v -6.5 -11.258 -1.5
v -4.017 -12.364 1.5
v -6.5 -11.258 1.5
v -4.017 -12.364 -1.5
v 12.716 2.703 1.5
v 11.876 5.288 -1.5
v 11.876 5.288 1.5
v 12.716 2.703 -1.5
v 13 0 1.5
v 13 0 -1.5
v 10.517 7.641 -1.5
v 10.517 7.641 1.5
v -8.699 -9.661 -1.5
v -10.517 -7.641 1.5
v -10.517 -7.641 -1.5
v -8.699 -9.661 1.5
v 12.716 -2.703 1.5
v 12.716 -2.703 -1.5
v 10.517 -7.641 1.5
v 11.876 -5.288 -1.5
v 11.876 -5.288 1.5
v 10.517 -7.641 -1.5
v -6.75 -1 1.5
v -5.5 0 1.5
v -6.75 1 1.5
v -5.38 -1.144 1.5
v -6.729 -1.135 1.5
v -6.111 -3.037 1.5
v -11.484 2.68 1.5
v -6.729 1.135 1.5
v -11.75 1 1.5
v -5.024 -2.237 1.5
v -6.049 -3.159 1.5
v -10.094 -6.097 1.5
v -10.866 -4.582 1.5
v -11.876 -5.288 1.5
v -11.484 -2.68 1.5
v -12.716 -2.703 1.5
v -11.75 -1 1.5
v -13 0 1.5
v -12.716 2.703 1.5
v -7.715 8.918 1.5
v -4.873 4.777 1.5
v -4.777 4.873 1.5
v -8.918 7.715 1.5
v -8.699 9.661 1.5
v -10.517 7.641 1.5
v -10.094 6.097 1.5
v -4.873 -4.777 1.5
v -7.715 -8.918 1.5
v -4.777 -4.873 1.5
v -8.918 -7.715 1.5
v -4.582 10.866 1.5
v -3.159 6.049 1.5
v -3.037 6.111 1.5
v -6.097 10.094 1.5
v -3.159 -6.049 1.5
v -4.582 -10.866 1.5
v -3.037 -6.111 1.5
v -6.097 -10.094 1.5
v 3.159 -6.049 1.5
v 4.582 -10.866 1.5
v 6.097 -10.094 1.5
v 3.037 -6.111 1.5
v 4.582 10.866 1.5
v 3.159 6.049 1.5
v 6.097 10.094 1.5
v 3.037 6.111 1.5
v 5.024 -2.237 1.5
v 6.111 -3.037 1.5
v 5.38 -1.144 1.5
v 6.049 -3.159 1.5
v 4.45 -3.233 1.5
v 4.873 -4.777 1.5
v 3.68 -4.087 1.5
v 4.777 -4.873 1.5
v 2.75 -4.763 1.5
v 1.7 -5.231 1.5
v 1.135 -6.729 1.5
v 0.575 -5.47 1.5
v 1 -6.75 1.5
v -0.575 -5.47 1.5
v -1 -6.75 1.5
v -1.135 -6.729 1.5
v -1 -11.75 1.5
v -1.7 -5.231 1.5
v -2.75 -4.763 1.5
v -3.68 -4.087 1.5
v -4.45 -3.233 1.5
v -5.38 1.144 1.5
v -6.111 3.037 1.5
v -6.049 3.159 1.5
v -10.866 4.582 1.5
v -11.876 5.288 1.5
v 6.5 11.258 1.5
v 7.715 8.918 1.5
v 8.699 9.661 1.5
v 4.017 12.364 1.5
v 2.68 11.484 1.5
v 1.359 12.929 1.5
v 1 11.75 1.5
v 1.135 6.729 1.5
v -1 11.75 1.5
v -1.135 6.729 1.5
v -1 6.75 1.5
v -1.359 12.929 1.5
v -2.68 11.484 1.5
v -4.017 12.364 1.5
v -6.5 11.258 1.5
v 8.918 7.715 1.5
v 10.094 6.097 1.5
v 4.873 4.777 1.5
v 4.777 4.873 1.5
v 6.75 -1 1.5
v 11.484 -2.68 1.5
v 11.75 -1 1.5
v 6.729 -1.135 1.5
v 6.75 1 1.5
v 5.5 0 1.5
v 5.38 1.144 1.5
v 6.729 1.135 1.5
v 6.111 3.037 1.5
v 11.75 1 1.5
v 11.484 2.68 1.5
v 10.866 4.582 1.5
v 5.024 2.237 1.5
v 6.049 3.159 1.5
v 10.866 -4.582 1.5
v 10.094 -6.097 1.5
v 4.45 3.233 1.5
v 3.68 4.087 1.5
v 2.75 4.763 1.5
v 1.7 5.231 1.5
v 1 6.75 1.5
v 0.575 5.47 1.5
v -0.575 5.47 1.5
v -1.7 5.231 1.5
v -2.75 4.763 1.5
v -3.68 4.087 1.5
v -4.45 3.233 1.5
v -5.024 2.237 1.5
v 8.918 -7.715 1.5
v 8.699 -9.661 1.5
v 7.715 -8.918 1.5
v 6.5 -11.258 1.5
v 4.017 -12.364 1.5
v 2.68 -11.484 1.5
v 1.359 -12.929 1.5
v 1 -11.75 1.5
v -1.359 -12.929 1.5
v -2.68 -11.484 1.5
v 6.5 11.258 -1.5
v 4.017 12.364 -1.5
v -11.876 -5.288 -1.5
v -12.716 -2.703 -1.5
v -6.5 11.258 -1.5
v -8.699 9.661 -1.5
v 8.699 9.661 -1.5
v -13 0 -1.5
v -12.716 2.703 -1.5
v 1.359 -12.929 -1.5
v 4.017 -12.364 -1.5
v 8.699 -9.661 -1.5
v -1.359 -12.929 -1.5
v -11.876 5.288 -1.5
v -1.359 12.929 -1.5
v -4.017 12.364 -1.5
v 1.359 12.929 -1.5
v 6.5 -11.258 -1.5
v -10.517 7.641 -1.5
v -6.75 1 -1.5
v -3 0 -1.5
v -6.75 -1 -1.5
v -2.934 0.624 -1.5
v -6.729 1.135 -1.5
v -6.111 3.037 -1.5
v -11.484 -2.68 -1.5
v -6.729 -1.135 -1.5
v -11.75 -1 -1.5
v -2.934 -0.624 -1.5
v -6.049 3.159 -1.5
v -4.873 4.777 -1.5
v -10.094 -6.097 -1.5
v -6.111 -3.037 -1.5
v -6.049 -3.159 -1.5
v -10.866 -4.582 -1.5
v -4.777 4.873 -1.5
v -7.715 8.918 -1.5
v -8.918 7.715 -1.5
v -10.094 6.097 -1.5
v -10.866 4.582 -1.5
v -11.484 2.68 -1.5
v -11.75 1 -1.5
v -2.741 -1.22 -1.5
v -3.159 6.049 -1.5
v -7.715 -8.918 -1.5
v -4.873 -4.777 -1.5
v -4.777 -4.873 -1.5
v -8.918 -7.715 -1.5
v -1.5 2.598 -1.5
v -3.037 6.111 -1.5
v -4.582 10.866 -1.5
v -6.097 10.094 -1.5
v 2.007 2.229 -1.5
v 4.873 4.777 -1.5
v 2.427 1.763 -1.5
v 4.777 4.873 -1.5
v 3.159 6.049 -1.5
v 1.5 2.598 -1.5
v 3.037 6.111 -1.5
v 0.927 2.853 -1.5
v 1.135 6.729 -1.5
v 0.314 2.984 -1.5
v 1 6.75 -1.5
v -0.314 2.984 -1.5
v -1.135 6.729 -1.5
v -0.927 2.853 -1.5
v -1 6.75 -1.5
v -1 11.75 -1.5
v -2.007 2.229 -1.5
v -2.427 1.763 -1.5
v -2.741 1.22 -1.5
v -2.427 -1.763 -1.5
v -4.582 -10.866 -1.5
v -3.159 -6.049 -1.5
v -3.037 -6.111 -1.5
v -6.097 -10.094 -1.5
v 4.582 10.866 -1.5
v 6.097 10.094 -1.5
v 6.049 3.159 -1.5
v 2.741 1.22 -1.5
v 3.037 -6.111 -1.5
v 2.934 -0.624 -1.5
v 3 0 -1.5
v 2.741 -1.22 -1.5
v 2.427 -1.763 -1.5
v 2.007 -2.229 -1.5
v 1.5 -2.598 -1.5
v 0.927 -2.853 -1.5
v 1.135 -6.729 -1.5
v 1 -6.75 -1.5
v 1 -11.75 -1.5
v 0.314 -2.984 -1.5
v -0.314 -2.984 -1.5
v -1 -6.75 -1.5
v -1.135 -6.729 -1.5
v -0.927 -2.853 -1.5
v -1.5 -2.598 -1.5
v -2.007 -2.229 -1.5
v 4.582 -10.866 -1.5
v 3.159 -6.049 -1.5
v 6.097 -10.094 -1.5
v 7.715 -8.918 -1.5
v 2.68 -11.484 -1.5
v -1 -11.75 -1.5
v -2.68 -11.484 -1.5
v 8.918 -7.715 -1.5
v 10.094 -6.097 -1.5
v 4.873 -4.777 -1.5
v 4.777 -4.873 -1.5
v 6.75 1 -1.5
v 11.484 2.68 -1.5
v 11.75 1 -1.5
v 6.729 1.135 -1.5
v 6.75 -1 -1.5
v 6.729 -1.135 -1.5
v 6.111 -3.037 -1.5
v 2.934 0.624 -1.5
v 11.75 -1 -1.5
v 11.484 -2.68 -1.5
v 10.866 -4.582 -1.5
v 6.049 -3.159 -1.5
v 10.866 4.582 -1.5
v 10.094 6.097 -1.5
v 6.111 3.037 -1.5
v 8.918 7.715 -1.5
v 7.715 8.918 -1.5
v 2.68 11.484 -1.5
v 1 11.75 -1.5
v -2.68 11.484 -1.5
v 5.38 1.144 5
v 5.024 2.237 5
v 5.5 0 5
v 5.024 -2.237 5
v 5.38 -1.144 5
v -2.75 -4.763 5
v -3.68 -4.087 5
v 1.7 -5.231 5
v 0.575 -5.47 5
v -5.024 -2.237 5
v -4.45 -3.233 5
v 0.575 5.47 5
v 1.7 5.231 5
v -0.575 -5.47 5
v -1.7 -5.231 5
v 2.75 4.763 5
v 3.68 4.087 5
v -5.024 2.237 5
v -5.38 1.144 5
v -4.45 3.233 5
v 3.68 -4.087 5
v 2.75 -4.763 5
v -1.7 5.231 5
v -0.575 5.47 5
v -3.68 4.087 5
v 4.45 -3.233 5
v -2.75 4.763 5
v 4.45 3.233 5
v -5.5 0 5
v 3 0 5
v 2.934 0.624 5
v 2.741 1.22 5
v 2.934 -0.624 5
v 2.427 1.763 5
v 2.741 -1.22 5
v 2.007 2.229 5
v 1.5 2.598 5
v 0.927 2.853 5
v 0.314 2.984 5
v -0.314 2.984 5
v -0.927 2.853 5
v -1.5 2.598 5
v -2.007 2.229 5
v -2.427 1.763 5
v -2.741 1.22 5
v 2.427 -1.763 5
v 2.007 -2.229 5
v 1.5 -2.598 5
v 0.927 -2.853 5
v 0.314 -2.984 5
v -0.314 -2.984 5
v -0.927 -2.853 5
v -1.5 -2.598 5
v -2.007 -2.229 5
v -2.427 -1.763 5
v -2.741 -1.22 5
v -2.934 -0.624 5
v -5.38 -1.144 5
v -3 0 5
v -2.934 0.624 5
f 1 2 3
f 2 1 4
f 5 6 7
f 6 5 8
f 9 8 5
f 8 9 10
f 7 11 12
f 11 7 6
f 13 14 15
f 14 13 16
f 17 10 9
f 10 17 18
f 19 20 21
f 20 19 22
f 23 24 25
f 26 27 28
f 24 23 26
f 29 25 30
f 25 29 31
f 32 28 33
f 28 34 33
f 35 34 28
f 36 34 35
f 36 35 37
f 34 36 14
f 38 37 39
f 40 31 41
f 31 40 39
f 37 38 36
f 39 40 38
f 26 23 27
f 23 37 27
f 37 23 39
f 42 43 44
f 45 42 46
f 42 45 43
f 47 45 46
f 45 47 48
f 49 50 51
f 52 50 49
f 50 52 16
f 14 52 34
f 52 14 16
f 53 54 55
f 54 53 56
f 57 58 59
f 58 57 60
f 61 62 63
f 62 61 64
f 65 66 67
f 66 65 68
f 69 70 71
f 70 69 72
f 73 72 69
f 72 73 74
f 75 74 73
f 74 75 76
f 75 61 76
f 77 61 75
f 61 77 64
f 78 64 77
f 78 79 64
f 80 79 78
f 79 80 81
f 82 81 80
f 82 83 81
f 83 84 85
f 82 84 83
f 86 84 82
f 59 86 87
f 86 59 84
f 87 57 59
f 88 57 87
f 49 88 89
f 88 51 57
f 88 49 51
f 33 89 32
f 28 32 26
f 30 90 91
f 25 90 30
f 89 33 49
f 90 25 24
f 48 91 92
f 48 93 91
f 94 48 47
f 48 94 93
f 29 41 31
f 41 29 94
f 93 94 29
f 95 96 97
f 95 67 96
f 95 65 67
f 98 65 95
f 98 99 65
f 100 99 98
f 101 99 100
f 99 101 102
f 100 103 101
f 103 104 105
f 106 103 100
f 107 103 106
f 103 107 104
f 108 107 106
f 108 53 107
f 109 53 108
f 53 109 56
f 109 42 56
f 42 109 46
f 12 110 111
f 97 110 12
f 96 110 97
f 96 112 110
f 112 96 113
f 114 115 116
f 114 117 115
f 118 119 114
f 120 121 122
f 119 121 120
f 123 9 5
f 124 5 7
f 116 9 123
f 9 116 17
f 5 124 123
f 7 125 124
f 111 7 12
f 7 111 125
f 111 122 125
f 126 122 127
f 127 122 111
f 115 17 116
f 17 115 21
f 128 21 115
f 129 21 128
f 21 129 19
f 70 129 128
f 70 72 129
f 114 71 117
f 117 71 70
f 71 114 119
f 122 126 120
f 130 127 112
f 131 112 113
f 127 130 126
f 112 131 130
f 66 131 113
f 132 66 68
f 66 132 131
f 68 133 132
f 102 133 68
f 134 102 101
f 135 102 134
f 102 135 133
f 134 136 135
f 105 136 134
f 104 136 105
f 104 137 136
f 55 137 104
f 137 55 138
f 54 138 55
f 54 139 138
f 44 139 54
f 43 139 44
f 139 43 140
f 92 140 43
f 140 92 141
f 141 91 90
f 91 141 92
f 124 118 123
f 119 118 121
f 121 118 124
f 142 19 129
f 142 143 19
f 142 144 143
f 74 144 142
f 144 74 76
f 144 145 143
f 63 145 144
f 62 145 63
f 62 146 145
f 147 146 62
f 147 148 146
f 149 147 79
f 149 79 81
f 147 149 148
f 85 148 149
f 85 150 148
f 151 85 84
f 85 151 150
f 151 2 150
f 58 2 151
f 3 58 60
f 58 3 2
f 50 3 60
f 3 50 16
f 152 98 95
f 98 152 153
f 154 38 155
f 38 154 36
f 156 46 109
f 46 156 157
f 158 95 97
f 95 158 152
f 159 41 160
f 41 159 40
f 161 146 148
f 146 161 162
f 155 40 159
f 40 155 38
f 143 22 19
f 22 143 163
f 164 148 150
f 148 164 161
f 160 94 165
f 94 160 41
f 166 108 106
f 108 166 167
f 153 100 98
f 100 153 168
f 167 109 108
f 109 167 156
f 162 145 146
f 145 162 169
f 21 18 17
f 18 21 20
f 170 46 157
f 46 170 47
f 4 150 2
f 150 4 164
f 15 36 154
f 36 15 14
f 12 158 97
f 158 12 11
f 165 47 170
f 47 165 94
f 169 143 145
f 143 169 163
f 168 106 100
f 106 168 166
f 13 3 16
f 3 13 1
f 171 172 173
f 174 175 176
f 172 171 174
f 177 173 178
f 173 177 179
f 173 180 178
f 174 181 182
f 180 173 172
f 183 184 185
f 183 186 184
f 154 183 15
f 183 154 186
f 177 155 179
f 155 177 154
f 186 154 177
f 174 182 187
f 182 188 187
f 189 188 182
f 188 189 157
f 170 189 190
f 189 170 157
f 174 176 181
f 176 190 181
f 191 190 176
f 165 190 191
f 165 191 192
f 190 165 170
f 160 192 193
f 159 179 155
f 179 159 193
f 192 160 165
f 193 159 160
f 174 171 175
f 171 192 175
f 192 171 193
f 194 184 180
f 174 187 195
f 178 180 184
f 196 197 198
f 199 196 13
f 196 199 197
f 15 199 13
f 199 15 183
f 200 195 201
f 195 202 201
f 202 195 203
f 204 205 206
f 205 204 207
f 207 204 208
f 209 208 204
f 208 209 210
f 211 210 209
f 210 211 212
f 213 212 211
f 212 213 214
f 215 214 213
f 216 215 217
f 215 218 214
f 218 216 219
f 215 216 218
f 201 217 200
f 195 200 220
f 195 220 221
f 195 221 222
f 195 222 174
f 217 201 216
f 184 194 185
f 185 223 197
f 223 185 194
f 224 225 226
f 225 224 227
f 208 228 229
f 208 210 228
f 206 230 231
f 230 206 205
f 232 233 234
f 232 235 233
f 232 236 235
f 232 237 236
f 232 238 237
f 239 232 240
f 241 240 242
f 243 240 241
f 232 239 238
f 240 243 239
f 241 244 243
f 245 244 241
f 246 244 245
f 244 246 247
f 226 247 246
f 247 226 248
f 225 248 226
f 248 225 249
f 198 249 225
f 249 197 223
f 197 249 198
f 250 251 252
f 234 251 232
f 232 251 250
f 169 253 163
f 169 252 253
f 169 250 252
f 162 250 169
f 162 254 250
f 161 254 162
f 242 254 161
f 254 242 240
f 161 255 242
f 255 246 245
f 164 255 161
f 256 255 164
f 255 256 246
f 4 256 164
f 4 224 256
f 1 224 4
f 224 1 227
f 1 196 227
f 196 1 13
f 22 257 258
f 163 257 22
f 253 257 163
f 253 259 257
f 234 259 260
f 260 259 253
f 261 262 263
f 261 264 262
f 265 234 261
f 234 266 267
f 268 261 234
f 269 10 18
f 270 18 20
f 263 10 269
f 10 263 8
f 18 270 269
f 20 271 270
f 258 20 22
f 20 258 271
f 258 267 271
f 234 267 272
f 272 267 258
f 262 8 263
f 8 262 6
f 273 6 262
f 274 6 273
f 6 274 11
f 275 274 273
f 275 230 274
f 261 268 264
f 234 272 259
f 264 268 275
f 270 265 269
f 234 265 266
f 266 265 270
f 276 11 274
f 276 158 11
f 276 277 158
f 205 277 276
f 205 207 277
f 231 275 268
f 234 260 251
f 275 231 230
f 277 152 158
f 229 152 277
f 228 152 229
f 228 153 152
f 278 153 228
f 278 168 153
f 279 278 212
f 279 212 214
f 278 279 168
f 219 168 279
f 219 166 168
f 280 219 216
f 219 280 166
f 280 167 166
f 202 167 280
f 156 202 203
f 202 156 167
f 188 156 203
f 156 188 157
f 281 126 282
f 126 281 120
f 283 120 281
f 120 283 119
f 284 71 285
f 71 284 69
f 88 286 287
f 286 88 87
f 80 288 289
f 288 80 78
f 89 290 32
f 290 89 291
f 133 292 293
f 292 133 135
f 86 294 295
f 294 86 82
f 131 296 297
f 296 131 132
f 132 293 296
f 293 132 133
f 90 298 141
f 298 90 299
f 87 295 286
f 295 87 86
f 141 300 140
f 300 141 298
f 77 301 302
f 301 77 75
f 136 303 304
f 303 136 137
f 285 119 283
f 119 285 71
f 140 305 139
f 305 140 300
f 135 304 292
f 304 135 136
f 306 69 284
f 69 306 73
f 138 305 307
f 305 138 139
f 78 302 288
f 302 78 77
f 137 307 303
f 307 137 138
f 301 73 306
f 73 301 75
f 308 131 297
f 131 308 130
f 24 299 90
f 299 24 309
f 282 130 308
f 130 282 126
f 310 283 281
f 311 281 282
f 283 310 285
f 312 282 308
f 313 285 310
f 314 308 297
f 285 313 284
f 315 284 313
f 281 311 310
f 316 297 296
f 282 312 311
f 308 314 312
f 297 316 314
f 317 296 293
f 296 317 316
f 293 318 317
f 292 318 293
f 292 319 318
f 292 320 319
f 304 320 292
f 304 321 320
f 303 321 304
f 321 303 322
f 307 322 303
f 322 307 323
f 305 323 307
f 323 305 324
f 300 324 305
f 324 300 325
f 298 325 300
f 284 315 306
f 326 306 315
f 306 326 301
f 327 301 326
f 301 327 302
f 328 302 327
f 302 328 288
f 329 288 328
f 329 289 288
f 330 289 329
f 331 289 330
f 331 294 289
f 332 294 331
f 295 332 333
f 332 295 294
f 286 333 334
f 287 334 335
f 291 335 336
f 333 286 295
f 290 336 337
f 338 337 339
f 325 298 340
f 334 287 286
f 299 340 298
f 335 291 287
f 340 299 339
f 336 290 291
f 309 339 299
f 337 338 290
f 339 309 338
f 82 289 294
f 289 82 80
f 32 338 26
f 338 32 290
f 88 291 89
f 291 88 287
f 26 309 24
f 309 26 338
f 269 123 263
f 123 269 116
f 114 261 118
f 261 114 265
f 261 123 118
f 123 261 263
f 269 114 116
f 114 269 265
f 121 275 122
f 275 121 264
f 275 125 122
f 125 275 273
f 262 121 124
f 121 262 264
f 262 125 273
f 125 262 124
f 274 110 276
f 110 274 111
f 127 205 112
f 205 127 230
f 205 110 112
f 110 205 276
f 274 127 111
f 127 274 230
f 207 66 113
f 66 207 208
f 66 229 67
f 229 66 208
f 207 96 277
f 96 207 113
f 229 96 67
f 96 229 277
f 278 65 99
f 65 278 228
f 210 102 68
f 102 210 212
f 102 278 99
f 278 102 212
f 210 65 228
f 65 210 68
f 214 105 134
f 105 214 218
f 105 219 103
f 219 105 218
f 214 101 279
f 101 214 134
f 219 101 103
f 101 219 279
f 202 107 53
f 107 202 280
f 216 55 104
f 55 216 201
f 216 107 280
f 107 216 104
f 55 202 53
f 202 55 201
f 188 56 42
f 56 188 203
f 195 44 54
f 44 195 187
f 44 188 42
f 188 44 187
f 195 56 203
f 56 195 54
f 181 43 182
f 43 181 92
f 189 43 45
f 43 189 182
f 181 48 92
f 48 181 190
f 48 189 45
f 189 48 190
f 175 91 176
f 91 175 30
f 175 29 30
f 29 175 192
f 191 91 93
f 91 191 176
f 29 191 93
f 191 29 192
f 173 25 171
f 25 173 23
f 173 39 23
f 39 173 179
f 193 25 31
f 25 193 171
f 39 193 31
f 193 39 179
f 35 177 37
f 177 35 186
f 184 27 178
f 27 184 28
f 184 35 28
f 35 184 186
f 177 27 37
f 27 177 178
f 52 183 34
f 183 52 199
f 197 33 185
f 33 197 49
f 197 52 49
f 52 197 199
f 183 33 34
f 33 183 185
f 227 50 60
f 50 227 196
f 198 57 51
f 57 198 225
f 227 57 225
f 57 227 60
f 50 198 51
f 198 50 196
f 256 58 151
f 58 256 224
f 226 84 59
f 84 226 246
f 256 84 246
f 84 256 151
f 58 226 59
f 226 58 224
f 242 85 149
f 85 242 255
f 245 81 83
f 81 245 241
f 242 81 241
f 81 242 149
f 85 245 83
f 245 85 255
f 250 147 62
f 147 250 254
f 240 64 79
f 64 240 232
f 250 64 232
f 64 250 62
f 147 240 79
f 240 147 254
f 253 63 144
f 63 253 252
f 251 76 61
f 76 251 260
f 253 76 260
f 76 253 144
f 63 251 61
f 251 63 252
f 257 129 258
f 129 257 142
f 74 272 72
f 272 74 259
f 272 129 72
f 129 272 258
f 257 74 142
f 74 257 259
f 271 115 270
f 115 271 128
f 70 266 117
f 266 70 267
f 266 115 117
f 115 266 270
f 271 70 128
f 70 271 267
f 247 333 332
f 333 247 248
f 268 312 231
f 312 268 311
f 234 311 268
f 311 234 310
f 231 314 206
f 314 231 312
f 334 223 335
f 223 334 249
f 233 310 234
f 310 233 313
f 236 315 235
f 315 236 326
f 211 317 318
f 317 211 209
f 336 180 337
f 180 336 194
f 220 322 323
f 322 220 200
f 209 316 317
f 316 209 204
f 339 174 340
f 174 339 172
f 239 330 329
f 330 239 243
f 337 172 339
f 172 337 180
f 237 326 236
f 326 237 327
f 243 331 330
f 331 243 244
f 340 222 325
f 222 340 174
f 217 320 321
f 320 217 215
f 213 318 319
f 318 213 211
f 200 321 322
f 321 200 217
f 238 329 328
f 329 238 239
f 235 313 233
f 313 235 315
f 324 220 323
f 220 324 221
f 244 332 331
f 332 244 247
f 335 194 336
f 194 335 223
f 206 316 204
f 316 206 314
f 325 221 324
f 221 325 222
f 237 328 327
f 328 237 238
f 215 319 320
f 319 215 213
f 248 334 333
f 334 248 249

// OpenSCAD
d1=6;
d2=d1+20;

difference(){
    union(){
        cylinder(d=d2,h=3,$fn=30,center=true);  
       
        cylinder(d=d1+5,h=5,$fn=30,center=false);  
    }
    cylinder(d=d1,h=10,$fn=30,center=true);  
     for(i=[0:360/20:360]){
            rotate([0,0,i])translate([((d1+5)/2)+(((d2-(d1+5))/2)/2),0,0])cube([(d2-(d1+5))/3,2,6],center=true);
    }
}

    
